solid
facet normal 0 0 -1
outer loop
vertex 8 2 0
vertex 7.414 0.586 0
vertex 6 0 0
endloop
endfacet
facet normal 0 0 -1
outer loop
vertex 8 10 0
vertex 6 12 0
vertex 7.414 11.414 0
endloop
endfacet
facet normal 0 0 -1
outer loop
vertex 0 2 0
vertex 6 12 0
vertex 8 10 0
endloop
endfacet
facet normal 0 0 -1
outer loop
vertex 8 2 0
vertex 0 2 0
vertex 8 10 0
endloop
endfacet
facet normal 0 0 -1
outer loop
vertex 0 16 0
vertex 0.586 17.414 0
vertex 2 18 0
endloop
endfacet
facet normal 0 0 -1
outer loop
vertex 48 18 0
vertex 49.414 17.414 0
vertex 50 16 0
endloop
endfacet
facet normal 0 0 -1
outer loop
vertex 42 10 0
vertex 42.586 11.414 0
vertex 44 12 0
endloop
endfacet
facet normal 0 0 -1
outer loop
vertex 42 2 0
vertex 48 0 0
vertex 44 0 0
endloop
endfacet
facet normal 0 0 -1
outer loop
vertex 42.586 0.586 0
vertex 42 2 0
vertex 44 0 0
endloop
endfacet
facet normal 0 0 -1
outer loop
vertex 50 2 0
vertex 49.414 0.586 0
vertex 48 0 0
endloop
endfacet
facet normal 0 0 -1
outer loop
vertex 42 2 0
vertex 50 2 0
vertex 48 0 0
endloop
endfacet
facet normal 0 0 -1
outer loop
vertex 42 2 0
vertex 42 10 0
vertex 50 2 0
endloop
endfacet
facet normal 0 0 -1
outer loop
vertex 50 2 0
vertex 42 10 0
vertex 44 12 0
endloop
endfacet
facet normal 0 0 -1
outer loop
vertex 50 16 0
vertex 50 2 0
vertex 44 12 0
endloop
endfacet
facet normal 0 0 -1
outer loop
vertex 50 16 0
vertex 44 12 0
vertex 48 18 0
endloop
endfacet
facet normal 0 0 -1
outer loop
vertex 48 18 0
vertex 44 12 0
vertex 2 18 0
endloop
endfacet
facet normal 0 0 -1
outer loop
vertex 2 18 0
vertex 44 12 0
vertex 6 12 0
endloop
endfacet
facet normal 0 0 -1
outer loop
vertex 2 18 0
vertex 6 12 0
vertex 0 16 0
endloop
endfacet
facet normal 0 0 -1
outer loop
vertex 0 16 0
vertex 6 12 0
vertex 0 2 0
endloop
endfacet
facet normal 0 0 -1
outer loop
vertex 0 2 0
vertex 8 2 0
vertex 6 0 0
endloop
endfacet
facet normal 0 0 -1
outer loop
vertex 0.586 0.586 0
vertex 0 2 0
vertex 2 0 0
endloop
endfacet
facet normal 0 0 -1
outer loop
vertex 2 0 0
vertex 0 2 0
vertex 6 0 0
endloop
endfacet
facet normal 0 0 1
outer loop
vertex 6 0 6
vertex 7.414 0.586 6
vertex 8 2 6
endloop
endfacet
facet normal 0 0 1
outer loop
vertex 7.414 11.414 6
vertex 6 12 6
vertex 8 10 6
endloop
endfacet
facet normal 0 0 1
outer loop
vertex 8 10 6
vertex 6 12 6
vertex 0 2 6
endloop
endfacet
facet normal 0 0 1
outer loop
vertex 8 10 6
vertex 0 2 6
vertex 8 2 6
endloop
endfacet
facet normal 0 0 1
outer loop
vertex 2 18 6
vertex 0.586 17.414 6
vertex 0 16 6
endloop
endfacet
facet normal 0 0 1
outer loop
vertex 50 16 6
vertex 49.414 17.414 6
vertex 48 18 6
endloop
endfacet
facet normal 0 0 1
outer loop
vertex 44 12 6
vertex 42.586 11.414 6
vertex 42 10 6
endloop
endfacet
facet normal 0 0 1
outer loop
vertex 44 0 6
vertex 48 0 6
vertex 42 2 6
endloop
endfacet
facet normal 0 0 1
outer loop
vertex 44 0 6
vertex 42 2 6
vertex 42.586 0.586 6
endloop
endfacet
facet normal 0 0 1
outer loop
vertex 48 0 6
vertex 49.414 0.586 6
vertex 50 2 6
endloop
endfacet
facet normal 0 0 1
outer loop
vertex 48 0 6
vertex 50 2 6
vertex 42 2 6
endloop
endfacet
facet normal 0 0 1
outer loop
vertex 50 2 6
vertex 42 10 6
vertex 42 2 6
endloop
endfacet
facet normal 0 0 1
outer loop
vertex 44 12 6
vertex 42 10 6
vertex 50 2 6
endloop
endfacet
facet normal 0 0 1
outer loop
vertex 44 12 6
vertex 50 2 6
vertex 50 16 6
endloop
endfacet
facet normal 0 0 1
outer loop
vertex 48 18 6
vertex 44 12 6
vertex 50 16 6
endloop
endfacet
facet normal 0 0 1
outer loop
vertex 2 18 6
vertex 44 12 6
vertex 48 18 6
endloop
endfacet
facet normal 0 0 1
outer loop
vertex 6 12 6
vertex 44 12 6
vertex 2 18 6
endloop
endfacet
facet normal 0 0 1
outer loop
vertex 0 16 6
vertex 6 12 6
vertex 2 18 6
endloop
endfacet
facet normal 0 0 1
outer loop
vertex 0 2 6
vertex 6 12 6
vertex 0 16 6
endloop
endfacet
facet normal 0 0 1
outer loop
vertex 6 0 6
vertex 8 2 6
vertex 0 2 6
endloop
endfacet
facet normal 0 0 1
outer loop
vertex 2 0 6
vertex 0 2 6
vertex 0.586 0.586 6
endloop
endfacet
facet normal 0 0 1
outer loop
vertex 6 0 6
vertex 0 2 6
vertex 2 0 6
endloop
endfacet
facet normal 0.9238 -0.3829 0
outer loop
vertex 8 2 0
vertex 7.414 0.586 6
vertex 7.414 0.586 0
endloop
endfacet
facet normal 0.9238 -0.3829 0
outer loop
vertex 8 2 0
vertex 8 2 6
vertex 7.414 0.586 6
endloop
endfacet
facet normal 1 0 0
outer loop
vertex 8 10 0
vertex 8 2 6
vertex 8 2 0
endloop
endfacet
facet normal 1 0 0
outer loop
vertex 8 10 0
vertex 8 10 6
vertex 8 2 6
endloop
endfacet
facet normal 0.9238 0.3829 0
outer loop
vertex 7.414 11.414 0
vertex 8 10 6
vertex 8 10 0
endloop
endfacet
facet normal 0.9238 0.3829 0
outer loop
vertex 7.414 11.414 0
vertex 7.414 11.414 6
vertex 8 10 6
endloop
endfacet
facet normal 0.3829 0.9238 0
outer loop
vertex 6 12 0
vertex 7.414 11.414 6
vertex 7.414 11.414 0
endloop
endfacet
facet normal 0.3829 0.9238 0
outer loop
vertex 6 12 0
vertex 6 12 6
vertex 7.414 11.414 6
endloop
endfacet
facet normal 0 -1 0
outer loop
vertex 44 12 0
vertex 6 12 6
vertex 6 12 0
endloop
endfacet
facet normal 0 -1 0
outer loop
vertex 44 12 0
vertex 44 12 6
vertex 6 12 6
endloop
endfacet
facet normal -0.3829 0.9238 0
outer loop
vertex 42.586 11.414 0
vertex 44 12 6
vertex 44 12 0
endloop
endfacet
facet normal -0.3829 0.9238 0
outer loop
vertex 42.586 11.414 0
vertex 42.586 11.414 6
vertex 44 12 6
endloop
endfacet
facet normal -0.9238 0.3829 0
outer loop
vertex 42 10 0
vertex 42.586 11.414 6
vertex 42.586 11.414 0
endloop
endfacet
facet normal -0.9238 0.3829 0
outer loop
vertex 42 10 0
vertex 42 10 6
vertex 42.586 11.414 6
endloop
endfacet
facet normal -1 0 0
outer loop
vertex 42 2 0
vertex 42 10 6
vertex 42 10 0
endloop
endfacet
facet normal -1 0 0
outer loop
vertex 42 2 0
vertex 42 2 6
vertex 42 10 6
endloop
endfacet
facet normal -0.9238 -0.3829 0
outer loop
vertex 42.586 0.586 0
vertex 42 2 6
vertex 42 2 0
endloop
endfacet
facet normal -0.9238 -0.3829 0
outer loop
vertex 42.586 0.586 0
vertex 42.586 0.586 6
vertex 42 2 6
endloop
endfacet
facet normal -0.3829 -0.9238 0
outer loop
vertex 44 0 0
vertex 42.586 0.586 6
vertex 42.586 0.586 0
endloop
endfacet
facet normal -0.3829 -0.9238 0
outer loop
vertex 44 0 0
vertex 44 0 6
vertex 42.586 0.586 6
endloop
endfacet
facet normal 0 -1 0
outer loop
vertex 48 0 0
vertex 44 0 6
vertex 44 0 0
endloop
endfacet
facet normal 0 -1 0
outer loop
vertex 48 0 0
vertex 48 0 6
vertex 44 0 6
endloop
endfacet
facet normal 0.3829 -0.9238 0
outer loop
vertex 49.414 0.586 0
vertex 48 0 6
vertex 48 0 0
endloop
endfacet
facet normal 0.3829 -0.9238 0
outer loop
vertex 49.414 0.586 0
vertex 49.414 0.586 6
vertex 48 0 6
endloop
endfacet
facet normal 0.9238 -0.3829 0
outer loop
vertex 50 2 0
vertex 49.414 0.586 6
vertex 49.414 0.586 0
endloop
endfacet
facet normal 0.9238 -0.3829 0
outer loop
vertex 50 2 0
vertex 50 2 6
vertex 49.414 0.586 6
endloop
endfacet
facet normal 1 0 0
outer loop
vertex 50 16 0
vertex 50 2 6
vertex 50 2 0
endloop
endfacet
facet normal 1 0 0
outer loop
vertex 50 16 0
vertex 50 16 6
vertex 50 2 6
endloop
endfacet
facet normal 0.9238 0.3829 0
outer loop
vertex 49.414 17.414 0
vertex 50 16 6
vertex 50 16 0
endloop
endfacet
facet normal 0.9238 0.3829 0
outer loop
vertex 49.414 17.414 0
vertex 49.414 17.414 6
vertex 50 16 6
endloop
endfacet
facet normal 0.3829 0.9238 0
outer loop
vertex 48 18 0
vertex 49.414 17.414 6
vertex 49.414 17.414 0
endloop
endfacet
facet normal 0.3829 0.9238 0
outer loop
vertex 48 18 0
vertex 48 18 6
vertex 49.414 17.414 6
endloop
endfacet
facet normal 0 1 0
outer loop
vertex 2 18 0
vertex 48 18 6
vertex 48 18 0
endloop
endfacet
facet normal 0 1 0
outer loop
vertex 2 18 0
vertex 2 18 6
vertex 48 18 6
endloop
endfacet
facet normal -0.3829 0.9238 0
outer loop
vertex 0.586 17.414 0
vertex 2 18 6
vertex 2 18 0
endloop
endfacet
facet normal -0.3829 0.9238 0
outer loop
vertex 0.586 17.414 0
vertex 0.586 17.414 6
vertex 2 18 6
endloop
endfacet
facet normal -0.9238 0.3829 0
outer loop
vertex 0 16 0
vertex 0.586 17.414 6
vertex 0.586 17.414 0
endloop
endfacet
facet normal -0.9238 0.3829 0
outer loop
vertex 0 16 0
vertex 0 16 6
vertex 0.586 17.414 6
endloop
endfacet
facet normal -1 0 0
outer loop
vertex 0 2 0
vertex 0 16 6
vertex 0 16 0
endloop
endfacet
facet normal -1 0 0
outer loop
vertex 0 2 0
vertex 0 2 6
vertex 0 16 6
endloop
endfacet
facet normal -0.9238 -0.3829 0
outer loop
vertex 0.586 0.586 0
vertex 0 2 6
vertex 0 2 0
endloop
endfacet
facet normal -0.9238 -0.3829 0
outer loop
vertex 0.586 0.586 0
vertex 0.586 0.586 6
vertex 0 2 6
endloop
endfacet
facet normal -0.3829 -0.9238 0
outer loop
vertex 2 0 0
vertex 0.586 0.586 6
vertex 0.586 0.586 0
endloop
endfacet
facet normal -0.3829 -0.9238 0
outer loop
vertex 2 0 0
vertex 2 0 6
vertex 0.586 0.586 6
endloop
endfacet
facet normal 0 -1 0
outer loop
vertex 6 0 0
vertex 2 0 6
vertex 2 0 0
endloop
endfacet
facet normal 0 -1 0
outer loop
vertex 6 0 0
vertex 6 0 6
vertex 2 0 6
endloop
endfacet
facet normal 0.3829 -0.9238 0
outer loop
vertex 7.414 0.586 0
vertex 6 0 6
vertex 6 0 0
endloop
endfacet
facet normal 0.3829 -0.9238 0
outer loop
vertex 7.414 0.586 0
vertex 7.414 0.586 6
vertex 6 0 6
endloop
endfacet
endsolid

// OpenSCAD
$fn = 32;

// ----------------------------------------------------------------------
// Clip blank: staple clip, 6 mm thick
// ----------------------------------------------------------------------

// --- parameters (mm) ---
profile_height = 6;       // extrusion height
profile_points = 24;      // points of the closed outline

profile = [[0, 2], [0.586, 0.586], [2, 0], [6, 0], [7.414, 0.586], [8, 2], [8, 10], [7.414, 11.414], [6, 12], [44, 12], [42.586, 11.414], [42, 10], [42, 2], [42.586, 0.586], [44, 0], [48, 0], [49.414, 0.586], [50, 2], [50, 16], [49.414, 17.414], [48, 18], [2, 18], [0.586, 17.414], [0, 16]];  // single closed polygon, 24 points, counter clockwise

// --- the one profile operation ---
linear_extrude(height = profile_height) polygon(points = profile);
